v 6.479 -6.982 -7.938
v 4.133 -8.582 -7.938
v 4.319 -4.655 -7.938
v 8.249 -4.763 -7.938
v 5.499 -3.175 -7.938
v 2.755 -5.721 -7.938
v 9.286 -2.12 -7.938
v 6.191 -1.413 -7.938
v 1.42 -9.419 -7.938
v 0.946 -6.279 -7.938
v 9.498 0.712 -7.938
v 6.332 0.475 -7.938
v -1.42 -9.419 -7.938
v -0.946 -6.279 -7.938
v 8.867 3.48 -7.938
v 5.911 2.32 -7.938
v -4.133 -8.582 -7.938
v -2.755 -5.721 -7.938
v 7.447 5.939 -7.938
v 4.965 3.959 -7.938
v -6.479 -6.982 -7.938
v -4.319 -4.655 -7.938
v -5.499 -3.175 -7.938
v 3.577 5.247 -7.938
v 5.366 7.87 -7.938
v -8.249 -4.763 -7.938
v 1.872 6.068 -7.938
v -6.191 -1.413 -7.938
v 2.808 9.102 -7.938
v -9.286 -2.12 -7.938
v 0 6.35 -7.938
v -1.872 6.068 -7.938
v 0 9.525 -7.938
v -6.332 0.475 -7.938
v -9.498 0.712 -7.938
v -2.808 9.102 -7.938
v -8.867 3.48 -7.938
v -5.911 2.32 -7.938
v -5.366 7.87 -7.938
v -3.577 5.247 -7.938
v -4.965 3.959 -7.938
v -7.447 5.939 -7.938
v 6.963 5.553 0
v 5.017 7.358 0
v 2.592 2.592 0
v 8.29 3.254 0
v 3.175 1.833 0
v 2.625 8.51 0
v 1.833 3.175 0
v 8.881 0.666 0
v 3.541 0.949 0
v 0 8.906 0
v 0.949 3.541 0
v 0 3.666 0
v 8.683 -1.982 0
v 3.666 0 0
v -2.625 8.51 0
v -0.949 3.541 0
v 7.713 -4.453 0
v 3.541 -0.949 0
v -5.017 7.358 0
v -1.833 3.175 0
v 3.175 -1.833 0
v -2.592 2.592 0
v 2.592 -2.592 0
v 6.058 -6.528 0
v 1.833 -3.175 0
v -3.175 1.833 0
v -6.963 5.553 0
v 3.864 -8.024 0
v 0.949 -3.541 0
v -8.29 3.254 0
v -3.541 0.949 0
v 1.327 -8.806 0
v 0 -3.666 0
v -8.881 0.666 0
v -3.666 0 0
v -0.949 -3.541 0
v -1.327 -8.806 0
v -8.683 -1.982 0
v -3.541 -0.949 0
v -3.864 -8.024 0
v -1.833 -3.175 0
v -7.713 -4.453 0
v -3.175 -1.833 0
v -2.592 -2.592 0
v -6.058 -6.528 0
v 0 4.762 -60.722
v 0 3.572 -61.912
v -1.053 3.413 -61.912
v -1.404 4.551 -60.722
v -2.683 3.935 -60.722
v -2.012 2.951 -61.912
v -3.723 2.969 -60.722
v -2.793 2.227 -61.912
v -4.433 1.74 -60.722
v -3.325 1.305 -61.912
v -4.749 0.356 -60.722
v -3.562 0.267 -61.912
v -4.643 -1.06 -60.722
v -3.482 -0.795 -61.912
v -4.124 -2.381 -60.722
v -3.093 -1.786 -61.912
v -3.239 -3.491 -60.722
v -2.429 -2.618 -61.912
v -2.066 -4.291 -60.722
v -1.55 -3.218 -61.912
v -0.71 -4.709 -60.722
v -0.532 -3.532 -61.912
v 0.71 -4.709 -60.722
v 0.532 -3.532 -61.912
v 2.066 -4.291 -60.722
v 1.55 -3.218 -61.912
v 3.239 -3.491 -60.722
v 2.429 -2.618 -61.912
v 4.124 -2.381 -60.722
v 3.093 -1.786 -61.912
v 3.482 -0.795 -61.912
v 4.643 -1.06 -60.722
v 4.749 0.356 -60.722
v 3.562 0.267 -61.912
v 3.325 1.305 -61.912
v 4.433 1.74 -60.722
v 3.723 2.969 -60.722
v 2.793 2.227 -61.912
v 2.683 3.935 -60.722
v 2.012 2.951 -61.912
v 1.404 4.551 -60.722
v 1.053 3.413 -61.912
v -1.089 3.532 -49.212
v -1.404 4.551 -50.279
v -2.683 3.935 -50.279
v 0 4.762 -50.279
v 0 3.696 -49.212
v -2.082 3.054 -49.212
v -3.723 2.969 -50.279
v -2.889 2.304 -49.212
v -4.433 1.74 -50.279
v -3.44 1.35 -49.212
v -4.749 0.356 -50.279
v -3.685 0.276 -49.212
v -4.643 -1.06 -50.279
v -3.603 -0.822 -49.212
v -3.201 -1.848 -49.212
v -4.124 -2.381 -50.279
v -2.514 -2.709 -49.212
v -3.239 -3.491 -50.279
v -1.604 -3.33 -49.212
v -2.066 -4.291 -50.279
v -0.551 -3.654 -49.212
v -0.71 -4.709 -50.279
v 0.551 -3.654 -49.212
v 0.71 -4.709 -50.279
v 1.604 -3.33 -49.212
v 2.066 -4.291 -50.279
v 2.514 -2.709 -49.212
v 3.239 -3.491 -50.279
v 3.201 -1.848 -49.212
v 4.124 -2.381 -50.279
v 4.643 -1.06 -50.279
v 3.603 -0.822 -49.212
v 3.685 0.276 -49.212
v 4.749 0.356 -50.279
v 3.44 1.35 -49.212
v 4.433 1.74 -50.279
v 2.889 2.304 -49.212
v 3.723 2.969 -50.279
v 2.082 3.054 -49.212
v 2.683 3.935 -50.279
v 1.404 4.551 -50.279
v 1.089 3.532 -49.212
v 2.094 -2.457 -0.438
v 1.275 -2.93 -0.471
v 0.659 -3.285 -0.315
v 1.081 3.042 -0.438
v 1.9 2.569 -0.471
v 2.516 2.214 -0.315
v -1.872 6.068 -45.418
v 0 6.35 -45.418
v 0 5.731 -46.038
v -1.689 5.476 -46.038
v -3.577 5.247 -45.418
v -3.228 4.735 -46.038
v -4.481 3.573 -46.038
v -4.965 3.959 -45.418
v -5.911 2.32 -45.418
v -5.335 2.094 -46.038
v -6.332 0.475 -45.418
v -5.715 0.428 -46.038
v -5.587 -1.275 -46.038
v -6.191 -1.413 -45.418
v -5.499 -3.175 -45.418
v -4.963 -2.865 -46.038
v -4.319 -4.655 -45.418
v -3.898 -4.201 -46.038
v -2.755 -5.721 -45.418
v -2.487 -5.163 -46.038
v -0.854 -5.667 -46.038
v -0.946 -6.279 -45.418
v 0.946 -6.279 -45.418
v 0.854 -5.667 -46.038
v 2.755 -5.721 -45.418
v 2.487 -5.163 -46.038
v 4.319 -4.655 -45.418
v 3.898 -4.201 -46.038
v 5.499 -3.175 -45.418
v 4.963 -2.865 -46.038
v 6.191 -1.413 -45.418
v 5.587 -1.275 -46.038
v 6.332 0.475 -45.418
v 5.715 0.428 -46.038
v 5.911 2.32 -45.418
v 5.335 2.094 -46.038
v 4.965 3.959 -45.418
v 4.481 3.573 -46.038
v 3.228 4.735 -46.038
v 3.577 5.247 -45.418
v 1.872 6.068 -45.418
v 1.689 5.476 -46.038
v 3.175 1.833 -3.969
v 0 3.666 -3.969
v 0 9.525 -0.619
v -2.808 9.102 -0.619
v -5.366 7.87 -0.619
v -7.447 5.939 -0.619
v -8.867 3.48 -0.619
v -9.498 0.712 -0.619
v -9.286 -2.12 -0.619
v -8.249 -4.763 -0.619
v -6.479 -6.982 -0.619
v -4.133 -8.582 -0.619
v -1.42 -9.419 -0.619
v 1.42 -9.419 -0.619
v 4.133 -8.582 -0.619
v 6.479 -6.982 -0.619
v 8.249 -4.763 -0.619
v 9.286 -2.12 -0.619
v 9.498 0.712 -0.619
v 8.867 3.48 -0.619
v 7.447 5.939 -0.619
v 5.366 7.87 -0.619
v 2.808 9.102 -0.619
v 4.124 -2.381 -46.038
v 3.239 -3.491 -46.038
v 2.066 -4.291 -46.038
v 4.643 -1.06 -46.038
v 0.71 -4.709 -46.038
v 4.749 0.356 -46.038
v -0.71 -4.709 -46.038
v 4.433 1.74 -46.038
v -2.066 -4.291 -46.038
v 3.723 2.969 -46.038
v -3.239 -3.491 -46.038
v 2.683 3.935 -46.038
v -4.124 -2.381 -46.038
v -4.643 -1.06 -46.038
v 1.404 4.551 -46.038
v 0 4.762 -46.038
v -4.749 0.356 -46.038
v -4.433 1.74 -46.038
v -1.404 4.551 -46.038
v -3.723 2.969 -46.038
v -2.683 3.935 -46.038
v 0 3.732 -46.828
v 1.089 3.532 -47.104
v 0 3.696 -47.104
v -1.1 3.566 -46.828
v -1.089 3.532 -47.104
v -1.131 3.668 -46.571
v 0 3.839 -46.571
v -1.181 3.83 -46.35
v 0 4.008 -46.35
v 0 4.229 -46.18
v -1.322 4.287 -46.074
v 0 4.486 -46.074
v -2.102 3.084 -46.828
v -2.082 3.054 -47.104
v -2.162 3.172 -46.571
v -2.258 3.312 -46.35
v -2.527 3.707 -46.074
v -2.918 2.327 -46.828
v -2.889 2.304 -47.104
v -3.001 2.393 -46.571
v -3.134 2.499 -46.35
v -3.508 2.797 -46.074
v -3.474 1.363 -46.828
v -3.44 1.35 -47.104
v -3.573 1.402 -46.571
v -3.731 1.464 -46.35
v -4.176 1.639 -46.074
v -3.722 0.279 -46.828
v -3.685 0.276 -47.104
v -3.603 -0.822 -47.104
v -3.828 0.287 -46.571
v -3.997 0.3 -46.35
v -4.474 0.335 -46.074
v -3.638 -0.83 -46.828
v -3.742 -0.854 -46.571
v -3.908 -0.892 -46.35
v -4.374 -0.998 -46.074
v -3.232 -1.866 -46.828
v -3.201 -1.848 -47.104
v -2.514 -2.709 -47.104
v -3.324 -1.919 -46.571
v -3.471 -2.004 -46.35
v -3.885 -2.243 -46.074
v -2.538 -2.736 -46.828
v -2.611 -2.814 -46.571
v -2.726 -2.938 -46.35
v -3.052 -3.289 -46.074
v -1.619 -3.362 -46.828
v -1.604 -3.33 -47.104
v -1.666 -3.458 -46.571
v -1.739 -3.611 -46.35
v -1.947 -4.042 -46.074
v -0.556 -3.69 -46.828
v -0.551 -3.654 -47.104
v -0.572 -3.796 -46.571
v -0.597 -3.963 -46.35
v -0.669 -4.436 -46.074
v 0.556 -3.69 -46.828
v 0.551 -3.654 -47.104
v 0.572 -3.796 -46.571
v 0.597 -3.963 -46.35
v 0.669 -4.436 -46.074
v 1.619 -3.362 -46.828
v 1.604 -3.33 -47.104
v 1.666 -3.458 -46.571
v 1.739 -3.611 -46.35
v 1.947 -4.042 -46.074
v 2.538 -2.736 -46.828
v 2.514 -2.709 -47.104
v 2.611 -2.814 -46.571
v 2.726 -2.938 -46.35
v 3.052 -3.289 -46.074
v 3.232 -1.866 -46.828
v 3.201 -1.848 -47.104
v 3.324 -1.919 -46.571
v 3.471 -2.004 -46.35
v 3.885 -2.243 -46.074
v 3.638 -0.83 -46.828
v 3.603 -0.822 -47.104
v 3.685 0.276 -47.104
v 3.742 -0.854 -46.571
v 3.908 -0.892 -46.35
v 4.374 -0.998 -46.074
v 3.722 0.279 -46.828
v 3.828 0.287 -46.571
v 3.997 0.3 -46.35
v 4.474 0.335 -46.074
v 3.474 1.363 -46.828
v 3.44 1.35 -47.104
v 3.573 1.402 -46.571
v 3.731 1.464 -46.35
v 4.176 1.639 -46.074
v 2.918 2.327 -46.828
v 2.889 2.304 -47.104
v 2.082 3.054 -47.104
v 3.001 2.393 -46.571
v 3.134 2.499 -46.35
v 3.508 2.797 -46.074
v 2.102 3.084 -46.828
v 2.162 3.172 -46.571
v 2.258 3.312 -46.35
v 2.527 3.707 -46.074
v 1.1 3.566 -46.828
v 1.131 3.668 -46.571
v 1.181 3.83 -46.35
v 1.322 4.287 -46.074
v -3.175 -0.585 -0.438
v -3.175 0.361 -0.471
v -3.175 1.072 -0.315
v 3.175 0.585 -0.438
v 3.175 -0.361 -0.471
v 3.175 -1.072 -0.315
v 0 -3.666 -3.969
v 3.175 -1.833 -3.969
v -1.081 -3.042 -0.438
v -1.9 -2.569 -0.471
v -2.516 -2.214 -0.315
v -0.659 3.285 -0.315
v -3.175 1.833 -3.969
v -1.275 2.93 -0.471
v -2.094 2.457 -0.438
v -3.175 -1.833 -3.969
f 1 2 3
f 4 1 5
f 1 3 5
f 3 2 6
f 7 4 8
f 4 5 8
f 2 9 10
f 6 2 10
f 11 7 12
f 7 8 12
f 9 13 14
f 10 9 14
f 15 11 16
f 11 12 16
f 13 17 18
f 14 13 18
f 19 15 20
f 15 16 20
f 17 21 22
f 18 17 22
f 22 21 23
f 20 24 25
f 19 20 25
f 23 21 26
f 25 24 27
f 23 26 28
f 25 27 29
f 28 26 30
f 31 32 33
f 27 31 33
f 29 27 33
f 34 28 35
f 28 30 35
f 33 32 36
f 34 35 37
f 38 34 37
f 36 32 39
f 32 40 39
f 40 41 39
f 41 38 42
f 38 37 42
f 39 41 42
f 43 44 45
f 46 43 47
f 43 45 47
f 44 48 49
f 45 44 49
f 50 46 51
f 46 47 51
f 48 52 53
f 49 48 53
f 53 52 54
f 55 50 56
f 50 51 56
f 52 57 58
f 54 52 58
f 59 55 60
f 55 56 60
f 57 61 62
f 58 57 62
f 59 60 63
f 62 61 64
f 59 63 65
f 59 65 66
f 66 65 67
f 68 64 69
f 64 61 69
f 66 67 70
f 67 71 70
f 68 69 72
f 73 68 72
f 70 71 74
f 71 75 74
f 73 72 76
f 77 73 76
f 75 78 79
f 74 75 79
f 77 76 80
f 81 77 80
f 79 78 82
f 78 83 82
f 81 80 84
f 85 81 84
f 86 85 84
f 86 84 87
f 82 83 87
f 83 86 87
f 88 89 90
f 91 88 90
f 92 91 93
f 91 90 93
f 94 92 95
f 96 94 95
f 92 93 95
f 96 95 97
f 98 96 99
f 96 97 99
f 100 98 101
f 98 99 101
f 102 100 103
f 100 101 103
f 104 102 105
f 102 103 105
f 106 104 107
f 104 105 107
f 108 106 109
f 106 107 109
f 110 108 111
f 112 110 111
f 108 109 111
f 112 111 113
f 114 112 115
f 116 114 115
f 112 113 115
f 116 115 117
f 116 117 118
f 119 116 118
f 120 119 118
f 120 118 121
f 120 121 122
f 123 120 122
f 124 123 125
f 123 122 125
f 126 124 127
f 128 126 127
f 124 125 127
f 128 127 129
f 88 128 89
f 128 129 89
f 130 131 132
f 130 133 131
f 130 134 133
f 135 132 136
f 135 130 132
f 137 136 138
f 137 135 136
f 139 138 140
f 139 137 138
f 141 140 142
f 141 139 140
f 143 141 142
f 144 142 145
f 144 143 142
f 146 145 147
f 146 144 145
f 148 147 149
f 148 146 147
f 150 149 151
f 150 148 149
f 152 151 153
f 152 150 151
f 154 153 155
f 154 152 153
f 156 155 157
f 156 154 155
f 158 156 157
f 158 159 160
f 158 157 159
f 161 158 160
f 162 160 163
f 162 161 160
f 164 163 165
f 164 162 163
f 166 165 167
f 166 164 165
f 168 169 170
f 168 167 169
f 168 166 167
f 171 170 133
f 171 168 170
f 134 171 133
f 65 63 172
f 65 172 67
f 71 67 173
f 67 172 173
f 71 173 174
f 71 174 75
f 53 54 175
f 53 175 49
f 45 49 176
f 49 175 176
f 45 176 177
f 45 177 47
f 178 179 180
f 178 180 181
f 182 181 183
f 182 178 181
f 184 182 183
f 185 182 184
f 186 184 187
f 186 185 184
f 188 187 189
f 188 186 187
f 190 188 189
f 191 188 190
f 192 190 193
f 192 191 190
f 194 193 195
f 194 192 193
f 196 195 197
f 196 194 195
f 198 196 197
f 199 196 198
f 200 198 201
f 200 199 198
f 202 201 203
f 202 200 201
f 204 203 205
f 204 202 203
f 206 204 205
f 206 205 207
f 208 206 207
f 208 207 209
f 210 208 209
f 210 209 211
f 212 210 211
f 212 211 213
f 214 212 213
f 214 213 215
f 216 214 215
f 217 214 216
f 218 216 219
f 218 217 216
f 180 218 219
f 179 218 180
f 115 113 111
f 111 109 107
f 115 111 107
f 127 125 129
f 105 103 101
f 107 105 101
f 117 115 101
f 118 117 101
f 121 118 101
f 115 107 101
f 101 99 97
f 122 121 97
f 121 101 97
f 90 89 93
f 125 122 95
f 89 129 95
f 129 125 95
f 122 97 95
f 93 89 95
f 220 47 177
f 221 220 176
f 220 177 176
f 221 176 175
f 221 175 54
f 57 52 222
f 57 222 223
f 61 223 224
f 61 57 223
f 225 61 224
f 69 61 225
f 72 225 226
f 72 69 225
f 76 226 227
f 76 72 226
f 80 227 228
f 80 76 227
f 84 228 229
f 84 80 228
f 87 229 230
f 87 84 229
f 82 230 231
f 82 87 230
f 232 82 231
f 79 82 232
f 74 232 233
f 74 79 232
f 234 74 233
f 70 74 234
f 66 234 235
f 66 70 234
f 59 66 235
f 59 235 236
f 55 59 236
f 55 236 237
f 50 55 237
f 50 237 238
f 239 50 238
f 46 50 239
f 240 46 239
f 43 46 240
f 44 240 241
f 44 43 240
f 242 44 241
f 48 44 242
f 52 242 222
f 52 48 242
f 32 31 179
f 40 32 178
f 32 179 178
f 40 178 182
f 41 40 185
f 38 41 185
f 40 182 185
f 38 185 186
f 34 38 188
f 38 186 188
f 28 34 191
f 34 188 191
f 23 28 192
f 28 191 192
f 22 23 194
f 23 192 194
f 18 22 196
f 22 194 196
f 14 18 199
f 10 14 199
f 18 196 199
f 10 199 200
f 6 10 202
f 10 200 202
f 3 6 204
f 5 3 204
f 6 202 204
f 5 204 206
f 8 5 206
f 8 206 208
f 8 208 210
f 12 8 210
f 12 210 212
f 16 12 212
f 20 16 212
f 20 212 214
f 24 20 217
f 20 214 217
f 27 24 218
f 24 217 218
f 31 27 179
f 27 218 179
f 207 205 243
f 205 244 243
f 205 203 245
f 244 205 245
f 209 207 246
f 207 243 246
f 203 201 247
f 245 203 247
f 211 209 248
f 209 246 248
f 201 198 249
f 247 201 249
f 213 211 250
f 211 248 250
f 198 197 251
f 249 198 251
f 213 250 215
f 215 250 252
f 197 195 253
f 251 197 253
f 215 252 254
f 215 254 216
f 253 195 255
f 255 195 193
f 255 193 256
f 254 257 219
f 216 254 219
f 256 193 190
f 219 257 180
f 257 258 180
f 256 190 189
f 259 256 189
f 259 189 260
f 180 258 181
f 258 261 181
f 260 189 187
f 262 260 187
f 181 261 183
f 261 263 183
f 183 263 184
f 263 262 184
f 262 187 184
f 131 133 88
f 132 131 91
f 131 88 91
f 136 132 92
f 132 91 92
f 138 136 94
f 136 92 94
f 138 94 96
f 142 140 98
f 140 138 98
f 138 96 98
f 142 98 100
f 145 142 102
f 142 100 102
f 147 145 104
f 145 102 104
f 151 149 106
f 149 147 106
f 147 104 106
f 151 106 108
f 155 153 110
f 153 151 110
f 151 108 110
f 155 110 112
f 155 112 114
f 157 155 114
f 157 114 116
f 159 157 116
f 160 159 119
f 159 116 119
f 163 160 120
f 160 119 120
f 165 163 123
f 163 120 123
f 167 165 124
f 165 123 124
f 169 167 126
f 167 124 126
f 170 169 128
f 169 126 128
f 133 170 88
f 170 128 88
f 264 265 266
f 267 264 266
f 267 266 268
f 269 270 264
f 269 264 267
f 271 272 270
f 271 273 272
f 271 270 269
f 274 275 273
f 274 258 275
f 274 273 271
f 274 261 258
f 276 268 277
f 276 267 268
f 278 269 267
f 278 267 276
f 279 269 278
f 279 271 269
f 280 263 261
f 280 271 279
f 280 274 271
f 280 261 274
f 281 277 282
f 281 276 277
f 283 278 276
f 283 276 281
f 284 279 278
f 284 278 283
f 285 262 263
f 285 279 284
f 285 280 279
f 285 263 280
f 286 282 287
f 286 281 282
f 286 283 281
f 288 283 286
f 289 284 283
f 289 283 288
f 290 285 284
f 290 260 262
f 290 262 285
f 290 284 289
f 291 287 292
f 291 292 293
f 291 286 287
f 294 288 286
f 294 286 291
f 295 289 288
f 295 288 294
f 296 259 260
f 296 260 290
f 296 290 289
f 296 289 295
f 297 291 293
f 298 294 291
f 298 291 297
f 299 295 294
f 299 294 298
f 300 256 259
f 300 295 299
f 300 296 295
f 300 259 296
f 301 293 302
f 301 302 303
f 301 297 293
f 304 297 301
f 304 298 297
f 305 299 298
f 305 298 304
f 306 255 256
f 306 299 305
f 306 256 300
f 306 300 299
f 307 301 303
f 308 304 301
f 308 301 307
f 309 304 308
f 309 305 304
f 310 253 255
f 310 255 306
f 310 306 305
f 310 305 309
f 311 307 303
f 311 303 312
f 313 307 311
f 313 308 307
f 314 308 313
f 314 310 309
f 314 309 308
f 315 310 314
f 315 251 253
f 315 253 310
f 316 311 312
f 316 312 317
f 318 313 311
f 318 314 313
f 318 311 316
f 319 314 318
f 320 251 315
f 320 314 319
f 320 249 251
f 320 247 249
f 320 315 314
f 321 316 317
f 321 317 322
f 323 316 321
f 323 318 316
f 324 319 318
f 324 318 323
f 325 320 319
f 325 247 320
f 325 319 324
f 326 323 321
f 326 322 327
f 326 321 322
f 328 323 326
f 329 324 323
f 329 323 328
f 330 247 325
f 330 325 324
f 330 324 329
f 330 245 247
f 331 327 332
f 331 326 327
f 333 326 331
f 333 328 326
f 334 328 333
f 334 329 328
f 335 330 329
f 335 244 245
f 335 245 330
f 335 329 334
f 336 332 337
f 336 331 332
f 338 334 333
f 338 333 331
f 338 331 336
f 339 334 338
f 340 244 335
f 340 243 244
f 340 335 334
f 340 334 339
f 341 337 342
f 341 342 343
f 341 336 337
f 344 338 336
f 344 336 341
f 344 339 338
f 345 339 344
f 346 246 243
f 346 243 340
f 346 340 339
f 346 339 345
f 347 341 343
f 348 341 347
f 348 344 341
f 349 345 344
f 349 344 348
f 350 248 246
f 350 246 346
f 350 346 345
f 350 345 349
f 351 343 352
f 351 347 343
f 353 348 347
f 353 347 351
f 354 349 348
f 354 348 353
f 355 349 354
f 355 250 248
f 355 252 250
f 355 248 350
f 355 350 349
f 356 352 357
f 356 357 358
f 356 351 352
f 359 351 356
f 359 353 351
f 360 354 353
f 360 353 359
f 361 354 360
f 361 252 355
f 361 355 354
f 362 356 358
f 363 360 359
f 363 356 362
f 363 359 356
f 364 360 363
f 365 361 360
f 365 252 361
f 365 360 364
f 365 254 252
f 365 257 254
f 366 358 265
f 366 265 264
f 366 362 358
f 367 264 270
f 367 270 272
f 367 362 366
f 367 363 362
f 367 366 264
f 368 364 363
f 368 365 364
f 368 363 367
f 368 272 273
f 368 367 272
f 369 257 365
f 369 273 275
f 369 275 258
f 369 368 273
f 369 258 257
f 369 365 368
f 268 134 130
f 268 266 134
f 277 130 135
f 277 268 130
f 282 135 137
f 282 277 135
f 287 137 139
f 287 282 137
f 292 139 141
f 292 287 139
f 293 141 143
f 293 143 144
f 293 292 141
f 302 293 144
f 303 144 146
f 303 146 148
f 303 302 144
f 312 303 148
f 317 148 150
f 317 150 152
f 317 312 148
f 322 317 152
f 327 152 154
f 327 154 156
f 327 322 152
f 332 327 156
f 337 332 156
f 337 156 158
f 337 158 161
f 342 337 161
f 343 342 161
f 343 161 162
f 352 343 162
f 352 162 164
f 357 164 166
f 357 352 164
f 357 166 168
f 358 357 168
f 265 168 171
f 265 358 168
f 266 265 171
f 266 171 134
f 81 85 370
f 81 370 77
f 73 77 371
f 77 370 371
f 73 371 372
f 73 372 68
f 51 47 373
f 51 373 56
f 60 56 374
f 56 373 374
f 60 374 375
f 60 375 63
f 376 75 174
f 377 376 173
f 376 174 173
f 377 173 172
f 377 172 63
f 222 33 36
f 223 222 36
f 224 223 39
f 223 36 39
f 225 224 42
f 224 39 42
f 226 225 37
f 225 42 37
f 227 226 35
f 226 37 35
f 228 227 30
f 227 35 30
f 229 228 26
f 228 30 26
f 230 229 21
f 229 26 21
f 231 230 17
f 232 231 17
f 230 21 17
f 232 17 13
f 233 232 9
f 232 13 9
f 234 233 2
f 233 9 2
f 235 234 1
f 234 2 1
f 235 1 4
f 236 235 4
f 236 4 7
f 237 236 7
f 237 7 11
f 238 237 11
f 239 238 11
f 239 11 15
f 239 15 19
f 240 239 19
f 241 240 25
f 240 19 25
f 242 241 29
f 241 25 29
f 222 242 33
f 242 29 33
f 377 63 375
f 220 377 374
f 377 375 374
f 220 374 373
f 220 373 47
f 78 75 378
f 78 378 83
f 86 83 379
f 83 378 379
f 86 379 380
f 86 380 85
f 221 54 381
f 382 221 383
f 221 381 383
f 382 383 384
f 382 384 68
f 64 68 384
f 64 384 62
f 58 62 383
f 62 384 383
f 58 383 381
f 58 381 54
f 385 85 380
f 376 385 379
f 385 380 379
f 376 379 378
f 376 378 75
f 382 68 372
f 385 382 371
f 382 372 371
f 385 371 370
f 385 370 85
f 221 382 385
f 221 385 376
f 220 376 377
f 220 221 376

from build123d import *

# Parameters (mm, degrees)
CHAMFER1_SIZE      = 1.190625
CHAMFER2_SIZE      = 0.619125
CUT_EXTRUDE2_DEPTH = 3.96875


with BuildPart() as part:
    # Sketch1 → Revolve1 (revolve)
    with BuildSketch(Plane(origin=(0, 0, 0), x_dir=(0, 0, -1), z_dir=(1, 0, 0))):
        Polygon((0, 9.525), (7.9375, 9.525), (7.9375, 6.35), (46.0375, 6.35), (46.0375, 4.7625), (61.9125, 4.7625), (61.9125, 0), (0, 0), align=None)
    revolve(axis=Axis((0, 0, -61.9125), (0, 0, 1)))

    # Sketch5 → Cut-Revolve1 (revolve, cut)
    with BuildSketch(Plane(origin=(0, 0, 0), x_dir=(0, 0, -1), z_dir=(1, 0, 0))):
        with BuildLine():
            Line((46.0375, 6.35), (51.8668, 6.35))
            Line((51.8668, 6.35), (49.2125, 3.6957))
            Line((49.2125, 3.6957), (47.1043, 3.6957))
            ThreePointArc((47.1043, 3.6957), (46.349958486, 4.008158486), (46.0375, 4.7625))
            Line((46.0375, 4.7625), (46.0375, 6.35))
        make_face()
    revolve(axis=Axis((0, 0, -61.9125), (0, 0, 1)), mode=Mode.SUBTRACT)

    # Chamfer1
    chamfer1_edges = [part.edges().sort_by_distance(p)[0] for p in [
        (0, -4.7625, -61.9125),
    ]]
    chamfer(chamfer1_edges, length=CHAMFER1_SIZE)

    # Chamfer2
    chamfer2_edges = [part.edges().sort_by_distance(p)[0] for p in [
        (0, -6.35, -46.0375),
        (0, -9.525, 0),
    ]]
    chamfer(chamfer2_edges, length=CHAMFER2_SIZE)

    # Sketch8 → Cut-Extrude2 (cut)
    with BuildSketch(Plane.XY):
        Polygon((3.175, 1.833087105), (0, 3.666174209), (-3.175, 1.833087105), (-3.175, -1.833087105), (0, -3.666174209), (3.175, -1.833087105), align=None)
    extrude(amount=-CUT_EXTRUDE2_DEPTH, mode=Mode.SUBTRACT)

    # Cut-Extrude4 cone 1 section (through the dimple's axis) → Cut-Extrude4 (revolve, cut)
    with BuildSketch(Plane(origin=(0, 0, 0), x_dir=(0, -1, 0), z_dir=(1, 0, 0))):
        Polygon((0, 0), (3.666174209, 0), (0, 3.666174209), align=None)
    revolve(axis=Axis((0, 0, 0), (0, 0, -1)), mode=Mode.SUBTRACT)


solid = part.part
